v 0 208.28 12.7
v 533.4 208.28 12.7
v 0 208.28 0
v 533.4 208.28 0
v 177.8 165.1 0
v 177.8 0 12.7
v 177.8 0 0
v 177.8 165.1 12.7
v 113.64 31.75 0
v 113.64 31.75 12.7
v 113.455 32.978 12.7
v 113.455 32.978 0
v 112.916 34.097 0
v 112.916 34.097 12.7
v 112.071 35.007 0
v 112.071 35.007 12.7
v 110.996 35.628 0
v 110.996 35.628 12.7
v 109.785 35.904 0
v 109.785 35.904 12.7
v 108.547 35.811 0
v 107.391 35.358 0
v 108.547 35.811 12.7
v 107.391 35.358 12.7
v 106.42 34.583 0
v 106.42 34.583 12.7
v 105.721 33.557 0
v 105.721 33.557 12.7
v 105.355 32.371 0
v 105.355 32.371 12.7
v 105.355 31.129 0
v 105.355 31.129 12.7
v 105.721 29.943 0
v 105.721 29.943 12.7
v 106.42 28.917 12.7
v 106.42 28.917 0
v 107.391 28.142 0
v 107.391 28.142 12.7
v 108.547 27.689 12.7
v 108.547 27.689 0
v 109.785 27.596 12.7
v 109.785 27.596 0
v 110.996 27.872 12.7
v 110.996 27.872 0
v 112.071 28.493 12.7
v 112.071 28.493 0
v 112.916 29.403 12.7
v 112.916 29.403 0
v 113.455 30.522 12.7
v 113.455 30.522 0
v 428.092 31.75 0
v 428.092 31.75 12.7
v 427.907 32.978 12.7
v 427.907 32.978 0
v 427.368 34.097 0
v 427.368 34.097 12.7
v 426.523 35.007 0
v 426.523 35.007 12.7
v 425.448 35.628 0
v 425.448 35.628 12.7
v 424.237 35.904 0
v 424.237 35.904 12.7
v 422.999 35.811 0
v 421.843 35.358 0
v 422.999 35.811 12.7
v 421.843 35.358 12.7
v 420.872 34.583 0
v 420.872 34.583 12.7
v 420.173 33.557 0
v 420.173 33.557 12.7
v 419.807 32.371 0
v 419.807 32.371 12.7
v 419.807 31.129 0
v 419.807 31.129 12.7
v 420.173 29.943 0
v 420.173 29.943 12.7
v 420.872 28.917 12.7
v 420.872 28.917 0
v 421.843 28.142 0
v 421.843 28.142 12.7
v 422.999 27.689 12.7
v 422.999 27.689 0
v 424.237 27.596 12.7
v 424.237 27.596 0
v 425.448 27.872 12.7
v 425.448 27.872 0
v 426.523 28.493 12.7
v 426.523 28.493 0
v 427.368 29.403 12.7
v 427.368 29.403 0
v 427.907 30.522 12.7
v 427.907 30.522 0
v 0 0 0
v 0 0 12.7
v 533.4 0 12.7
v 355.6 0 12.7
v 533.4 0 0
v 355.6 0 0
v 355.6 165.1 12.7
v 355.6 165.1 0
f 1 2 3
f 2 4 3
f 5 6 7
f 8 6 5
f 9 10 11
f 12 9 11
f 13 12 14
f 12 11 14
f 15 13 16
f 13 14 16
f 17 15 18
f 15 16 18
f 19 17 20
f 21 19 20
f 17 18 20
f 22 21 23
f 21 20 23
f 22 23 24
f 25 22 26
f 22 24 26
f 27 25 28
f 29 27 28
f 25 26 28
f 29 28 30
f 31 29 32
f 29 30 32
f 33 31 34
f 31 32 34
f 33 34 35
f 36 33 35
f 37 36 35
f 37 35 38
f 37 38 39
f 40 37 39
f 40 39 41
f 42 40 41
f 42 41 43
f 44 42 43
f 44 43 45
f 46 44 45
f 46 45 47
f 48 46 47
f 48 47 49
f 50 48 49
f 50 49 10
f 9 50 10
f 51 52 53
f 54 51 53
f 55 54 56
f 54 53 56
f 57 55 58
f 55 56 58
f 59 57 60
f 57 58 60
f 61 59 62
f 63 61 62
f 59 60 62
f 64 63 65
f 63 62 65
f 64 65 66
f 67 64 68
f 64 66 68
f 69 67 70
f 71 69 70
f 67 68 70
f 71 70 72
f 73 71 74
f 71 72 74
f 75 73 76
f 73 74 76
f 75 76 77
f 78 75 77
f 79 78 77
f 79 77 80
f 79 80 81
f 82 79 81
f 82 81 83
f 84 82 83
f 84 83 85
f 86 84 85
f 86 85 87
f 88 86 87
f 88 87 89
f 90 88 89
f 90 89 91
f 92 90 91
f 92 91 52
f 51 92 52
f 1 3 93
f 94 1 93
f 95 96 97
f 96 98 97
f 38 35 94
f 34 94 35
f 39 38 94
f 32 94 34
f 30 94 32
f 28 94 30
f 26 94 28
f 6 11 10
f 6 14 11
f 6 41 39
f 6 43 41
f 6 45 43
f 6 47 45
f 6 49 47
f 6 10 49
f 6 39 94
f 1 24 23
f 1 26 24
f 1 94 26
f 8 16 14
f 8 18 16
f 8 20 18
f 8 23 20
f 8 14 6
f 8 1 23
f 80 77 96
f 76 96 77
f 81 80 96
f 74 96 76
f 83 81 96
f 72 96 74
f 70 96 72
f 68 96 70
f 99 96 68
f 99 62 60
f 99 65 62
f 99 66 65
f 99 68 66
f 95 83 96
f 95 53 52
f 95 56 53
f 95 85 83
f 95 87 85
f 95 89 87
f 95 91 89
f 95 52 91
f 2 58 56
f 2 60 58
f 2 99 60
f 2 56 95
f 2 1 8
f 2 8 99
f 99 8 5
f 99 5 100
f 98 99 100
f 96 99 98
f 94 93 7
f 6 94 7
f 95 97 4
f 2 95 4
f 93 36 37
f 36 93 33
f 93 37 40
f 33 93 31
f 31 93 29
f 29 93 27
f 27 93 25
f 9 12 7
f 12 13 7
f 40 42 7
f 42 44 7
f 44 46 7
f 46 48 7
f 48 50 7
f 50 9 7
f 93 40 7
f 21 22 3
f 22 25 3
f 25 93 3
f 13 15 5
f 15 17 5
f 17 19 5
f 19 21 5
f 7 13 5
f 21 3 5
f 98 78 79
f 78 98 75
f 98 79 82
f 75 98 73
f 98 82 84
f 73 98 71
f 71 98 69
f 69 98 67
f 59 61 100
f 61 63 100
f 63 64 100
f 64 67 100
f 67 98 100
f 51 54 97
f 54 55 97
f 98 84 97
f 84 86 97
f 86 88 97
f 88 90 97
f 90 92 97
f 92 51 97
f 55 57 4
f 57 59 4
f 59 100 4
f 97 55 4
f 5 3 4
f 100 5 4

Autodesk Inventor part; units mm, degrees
ref_plane "YZ Plane" through (0, 0, 0) normal (1, 0, 0) x (0, 1, 0)
ref_plane "XZ Plane" through (0, 0, 0) normal (0, 1, 0) x (-1, 0, 0)
ref_plane "XY Plane" through (0, 0, 0) normal (0, 0, 1) x (1, 0, 0)
sketch "Sketch1" plane through (0, 0, 0) normal (0, 0, 1) x (1, 0, 0)
  line L0 (0, 0) -> (533.4, 0)
  line L1 (533.4, 0) -> (533.4, 208.28)
  line L2 (533.4, 208.28) -> (0, 208.28)
  line L3 (0, 208.28) -> (0, 0)
  dimension "d0" = 533.4
  dimension "d1" = 208.28
extrude "Extrusion1" add sketch "Sketch1" along normal blind 12.7
sketch "Sketch2" plane through (0, 0, 12.7) normal (0, 0, 1) x (1, 0, 0)
  line L0 (0, 0) -> (533.4, 0) projected
  line L1 (355.6, 0) -> (177.8, 0)
  line L2 (177.8, 0) -> (177.8, 165.1)
  line L3 (177.8, 165.1) -> (355.6, 165.1)
  line L4 (355.6, 165.1) -> (355.6, 0)
  line L5 (533.4, 0) -> (533.4, 208.28) projected
  line L6 (0, 208.28) -> (0, 0) projected
  dimension "d4" = 165.1
  dimension "d5" = 177.8
  dimension "d6" = 177.8
extrude "Extrusion2" cut sketch "Sketch2" against normal blind 12.7
sketch "Sketch3" plane through (0, 0, 12.7) normal (0, 0, 1) x (1, 0, 0)
  circle A0 centre (423.926, 31.75) radius 4.1656
  line L0 (533.4, 0) -> (533.4, 208.28) projected
  circle A1 centre (109.474, 31.75) radius 4.1656
  line L1 (0, 208.28) -> (0, 0) projected
  line L2 (0, 0) -> (177.8, 0) projected
  line L3 (355.6, 0) -> (533.4, 0) projected
  dimension "d9" = 109.474
  dimension "d10" = 8.3312
  dimension "d11" = 8.3312
  dimension "d12" = 109.474
  dimension "d13" = 31.75
  dimension "d14" = 31.75
extrude "Extrusion3" cut sketch "Sketch3" against normal blind 25.4
properties part number "Front wall" material "Polycarbonate, Clear"
